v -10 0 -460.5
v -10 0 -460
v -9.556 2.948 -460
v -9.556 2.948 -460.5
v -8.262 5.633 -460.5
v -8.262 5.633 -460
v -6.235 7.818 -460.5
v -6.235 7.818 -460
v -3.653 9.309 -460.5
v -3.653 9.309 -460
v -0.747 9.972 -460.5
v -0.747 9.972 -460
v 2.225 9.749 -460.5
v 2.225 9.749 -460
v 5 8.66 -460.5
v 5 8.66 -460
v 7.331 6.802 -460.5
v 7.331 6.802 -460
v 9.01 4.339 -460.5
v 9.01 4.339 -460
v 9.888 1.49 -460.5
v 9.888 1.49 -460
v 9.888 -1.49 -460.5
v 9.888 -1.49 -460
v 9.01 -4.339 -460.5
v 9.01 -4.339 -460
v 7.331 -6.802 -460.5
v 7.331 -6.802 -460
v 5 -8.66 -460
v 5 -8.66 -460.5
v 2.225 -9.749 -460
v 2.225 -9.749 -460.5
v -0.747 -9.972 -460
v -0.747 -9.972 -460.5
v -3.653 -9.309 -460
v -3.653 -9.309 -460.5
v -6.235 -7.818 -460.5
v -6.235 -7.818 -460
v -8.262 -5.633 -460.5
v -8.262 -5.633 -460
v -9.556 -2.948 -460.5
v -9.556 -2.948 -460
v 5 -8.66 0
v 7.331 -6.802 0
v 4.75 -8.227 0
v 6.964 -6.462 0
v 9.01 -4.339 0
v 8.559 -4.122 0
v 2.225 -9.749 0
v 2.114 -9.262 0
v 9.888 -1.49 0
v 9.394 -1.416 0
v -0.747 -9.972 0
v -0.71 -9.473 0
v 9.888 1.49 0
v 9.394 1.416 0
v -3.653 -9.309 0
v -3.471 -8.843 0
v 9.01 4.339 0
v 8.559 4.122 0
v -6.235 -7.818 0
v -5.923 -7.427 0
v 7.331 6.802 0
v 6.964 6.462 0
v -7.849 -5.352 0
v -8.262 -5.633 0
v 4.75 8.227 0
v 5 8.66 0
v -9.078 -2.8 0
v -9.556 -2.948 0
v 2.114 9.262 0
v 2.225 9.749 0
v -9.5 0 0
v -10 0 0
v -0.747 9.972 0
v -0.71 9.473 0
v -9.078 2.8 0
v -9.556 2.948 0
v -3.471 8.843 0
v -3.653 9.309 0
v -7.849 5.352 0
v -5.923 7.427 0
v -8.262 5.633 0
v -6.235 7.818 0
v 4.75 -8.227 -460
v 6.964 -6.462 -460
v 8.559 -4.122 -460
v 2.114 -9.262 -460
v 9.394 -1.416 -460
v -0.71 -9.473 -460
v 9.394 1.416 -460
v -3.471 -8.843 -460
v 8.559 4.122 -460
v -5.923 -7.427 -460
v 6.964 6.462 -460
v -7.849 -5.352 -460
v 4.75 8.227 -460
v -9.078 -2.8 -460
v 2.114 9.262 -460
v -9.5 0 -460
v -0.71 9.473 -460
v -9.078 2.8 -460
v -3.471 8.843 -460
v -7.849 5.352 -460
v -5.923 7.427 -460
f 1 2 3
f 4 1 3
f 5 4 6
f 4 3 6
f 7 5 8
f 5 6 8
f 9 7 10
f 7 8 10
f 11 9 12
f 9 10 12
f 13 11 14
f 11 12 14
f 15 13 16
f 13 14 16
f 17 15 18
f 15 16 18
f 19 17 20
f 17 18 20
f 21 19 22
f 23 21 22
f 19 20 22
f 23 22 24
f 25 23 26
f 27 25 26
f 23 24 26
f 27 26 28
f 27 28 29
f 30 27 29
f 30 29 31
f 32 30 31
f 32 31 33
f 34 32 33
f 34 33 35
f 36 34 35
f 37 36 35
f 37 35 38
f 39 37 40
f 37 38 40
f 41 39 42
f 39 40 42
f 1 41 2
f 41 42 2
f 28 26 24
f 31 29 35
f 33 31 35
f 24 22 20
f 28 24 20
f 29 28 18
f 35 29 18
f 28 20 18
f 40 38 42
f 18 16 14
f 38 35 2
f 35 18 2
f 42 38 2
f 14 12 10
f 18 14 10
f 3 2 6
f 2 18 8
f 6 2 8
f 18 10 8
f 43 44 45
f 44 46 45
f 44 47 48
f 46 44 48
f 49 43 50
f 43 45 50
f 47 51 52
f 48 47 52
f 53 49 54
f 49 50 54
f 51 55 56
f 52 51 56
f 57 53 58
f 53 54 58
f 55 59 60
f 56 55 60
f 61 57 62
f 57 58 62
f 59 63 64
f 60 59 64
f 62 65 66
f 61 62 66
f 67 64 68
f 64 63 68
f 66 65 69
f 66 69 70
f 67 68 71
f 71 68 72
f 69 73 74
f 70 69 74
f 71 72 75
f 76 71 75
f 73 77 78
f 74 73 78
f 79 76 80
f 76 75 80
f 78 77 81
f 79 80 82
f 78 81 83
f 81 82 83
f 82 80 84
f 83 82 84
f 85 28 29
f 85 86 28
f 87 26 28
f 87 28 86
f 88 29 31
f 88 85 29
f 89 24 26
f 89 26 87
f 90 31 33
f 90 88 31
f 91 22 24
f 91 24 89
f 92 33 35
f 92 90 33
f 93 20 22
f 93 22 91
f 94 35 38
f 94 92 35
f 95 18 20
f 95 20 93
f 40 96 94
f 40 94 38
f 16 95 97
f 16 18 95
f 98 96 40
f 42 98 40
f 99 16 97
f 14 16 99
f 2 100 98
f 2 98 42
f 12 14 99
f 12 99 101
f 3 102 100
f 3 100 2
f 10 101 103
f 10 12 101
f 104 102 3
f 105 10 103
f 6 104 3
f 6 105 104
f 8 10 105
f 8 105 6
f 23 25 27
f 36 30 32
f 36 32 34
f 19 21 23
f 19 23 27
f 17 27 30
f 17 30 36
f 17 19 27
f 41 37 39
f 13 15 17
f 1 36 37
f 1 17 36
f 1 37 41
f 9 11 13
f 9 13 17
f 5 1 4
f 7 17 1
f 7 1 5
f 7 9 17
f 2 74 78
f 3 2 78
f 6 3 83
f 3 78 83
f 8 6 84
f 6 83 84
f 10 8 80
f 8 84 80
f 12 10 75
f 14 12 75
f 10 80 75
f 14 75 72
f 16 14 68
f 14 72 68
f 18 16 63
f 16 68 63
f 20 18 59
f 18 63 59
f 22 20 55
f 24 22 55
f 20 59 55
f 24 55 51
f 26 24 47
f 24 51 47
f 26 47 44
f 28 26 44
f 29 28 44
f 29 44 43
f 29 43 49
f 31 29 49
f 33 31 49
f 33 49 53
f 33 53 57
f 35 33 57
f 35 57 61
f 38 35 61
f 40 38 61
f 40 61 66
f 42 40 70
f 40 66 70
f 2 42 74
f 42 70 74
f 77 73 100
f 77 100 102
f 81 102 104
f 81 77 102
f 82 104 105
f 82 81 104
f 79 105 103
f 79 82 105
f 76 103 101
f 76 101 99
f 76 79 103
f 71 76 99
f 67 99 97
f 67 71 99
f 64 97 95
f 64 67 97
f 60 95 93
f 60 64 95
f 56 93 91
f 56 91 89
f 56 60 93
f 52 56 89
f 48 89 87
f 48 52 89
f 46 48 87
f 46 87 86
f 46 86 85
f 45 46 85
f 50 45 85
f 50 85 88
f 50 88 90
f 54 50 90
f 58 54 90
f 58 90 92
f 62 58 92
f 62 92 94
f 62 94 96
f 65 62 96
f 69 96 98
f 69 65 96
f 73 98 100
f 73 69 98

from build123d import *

# Parameters (mm, degrees)
SKETCH11_R              = 10
SKETCH11_R_2            = 9.5
PIPE_26_9_X_3_2_1_DEPTH = 460
SKETCH13_R              = 10
BOSS_EXTRUDE2_DEPTH     = 0.5


with BuildPart() as part:
    # Sketch11 → Pipe 26.9 X 3.2(1) (new body)
    with BuildSketch(Plane(origin=(0, 0, 0), x_dir=(-1, 0, 0), z_dir=(0, 0, -1))):
        Circle(SKETCH11_R)
        Circle(SKETCH11_R_2, mode=Mode.SUBTRACT)
    extrude(amount=PIPE_26_9_X_3_2_1_DEPTH)


with BuildPart() as body_2:
    # Sketch13 → Boss-Extrude2 (new body)
    with BuildSketch(Plane(origin=(0, 0, -460), x_dir=(-1, 0, 0), z_dir=(0, 0, -1))):
        Circle(SKETCH13_R)
    extrude(amount=BOSS_EXTRUDE2_DEPTH)


solid = Compound([part.part, body_2.part])
